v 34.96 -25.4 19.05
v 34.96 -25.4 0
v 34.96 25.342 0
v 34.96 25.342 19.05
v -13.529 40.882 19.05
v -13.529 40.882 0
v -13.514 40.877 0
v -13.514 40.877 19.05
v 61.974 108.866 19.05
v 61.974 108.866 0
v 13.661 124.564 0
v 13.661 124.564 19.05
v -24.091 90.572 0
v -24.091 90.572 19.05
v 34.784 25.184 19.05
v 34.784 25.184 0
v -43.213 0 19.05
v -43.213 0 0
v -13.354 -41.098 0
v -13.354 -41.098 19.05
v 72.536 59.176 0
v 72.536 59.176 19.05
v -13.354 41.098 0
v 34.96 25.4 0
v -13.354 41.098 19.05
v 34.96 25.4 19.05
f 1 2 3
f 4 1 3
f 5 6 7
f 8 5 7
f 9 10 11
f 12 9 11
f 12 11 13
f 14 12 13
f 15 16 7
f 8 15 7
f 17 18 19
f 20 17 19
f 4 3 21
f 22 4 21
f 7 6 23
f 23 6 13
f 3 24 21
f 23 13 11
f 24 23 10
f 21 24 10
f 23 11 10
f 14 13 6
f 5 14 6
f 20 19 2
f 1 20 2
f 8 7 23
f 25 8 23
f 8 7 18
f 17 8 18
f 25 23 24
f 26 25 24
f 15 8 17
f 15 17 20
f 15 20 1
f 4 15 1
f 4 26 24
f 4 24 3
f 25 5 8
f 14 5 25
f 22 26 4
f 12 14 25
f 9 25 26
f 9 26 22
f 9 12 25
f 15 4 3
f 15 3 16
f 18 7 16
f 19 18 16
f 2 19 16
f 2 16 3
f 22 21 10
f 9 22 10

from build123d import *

# Parameters (mm, degrees)
F1_DEPTH = 19.05
F3_DEPTH = 6.35


with BuildPart() as f1:
    # F0 (on Top) → F1 (new body)
    with BuildSketch(Plane.XY):
        Polygon((34.96010078, -25.4), (34.96010078, 25.3421400921), (34.7843567738, 25.1838994782), (-13.5141550661, 40.8770372737), (-43.2130610643, 0), (-13.3535702478, -41.0980633142), align=None)
    extrude(amount=F1_DEPTH)

    # F2 (on Top) → F3 (join)
    with BuildSketch(Plane.XY):
        Polygon((30.8235474857, 22.3946181123), (-11.7735474857, 36.2352532708), (-38.1, 0), (-11.7735474857, -36.2352532708), (30.8235474857, -22.3946181123), align=None)
    extrude(amount=F3_DEPTH)


with BuildPart() as f1b:
    # F0 (on Top) → F1, piece 2 (new body)
    with BuildSketch(Plane.XY):
        Polygon((-13.3535702478, 41.0980633142), (34.96010078, 25.4), (34.96010078, 25.3421400921), (72.5361139081, 59.1757342813), (61.9742000145, 108.8656323985), (13.6605289867, 124.5636957128), (-24.0912281475, 90.5718609097), (-13.529314254, 40.8819627925), (-13.5141550661, 40.8770372737), align=None)
    extrude(amount=F1_DEPTH)

    # F2 (on Top) → F3, piece 2 (join)
    with BuildSketch(Plane.XY):
        Polygon((65.8560563026, 60.7291496289), (56.7743352886, 103.4552877571), (15.231553757, 116.953355713), (-17.2295067606, 87.7252855408), (-8.1477857467, 44.9991474126), (33.3949957849, 31.5010794567), align=None)
    extrude(amount=F3_DEPTH)


solid = Compound([f1.part, f1b.part])
